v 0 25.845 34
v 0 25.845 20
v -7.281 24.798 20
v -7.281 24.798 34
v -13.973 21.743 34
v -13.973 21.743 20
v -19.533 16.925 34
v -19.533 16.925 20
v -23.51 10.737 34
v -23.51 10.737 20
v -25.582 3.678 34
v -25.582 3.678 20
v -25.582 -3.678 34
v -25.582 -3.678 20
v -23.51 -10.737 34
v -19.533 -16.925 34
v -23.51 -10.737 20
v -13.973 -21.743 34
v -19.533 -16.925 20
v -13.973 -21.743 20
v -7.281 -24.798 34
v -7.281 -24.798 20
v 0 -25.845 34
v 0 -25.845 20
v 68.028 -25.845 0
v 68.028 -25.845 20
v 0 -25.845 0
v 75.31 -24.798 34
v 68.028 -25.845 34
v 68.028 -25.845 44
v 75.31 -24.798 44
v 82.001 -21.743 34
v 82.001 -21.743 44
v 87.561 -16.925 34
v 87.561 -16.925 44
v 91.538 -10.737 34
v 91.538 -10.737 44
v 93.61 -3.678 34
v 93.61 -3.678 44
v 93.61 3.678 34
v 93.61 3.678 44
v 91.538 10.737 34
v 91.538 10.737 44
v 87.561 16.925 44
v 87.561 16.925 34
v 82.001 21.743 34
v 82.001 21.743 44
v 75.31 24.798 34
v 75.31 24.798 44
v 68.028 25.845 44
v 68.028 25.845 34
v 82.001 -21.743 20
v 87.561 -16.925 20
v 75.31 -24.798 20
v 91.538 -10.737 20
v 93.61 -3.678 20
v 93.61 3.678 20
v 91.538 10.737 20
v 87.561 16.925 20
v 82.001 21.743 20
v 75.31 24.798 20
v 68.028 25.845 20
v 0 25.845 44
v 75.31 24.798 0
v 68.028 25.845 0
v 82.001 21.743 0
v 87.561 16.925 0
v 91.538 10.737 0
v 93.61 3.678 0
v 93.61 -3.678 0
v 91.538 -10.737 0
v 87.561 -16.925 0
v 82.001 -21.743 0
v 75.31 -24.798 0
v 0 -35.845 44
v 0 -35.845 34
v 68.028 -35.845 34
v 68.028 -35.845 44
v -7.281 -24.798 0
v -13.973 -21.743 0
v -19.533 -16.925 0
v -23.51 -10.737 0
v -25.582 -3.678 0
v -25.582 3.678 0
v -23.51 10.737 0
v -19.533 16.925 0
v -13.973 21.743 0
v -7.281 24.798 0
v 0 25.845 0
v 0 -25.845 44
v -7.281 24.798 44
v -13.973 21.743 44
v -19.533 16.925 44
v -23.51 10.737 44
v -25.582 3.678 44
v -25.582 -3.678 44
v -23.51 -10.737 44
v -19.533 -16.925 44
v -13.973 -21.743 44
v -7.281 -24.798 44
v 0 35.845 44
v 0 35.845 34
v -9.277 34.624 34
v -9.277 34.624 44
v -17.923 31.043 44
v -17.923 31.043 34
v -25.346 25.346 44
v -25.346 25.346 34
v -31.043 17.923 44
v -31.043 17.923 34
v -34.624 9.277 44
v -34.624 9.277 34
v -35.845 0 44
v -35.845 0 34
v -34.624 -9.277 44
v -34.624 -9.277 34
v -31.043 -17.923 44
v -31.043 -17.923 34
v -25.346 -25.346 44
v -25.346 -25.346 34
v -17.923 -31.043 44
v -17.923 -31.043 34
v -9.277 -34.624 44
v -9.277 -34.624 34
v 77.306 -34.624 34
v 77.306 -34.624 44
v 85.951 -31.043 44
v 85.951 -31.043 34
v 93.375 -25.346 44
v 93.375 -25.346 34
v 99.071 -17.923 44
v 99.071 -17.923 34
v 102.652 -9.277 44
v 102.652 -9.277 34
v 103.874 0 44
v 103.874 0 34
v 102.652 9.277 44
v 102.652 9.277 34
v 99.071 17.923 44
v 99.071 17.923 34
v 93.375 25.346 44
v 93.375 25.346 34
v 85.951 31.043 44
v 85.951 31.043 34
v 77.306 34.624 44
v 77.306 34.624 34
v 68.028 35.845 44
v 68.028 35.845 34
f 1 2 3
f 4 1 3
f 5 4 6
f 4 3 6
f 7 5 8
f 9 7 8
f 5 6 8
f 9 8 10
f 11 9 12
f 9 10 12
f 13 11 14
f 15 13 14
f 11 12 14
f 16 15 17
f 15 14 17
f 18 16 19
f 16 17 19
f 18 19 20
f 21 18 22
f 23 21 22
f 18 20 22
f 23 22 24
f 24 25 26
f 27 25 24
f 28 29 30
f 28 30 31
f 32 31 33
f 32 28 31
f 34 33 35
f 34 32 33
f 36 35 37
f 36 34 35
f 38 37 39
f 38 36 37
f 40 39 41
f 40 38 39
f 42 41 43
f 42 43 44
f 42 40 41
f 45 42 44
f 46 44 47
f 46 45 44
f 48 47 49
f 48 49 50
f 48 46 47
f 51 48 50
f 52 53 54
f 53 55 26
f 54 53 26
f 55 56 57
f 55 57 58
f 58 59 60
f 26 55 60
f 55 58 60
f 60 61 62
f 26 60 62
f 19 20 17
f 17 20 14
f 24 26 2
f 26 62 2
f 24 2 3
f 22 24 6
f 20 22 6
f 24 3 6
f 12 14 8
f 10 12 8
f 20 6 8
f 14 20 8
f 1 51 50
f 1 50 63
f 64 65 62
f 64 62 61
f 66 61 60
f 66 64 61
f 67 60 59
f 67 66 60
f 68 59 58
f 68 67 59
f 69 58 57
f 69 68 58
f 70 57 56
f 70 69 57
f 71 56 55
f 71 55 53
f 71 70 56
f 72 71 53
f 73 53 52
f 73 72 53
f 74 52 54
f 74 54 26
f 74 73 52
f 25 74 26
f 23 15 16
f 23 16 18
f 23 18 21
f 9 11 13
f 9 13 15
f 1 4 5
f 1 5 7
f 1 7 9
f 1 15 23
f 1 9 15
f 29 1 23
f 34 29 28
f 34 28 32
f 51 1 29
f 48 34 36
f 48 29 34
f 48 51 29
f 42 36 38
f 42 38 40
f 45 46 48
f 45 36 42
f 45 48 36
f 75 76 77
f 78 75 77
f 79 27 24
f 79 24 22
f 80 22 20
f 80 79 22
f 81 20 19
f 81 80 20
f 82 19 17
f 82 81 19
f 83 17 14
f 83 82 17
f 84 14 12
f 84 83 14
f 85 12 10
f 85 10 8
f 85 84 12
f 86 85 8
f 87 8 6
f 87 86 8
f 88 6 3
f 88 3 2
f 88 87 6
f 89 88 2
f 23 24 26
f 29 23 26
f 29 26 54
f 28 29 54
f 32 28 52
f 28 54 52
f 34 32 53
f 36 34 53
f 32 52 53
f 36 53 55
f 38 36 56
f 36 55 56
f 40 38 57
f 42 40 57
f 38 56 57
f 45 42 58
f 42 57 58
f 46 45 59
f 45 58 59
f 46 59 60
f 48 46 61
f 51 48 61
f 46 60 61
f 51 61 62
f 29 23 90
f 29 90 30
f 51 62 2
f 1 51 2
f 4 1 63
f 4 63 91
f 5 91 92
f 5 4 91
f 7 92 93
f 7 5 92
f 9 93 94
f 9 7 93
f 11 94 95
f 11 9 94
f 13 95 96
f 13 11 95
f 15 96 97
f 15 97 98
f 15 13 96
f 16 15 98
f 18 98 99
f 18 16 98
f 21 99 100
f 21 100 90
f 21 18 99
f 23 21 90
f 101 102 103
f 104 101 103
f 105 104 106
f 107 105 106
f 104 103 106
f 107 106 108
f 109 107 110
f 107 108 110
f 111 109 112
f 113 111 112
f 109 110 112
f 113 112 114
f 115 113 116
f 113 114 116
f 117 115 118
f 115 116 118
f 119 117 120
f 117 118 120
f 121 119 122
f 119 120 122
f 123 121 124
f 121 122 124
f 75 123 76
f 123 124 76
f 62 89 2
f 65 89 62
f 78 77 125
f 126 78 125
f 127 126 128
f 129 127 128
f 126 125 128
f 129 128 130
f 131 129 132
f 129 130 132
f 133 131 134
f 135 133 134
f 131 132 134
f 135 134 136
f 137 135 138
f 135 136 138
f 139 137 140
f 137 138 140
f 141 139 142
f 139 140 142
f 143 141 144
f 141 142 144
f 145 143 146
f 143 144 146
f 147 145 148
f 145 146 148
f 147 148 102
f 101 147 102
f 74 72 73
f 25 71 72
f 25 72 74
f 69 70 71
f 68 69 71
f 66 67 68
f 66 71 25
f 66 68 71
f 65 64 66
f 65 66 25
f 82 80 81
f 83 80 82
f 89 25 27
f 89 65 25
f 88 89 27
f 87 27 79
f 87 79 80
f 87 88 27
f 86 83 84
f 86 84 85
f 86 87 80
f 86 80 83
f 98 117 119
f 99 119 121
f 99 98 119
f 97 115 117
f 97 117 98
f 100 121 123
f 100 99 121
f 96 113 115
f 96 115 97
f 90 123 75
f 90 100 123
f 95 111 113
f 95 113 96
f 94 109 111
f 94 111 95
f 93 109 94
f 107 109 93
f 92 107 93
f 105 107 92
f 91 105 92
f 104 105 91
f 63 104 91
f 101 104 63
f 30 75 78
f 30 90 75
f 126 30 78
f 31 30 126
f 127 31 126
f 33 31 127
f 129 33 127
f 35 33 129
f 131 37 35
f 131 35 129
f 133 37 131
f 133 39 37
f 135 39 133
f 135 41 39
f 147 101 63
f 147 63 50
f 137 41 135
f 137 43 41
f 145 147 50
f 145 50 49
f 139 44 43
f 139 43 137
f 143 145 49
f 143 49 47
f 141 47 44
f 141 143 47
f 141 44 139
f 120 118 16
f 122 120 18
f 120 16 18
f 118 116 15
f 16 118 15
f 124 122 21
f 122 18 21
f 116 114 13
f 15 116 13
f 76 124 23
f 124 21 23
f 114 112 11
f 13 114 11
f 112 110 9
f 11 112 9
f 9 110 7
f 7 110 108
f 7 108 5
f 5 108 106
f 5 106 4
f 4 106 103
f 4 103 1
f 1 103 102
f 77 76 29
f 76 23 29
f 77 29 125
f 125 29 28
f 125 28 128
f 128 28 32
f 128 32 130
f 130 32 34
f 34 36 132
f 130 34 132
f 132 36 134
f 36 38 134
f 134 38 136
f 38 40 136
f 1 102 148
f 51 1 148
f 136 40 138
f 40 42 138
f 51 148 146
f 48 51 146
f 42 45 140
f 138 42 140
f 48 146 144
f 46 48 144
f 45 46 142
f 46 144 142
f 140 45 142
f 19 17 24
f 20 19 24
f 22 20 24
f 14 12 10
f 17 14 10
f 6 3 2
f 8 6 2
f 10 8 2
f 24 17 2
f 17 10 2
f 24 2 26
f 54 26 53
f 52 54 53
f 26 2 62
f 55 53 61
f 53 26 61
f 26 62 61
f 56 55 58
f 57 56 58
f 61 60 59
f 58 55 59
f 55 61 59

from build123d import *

# Parameters (mm, degrees)
EXTRUDE_1_DEPTH   = 20
EXTRUDE_2_DEPTH   = 14
EXTRUDE_1_2_DEPTH = 10


with BuildPart() as part:
    # 草图1 → Extrude 1 (new body)
    with BuildSketch(Plane.XY):
        with BuildLine():
            Line((0, 25.845361824), (68.028206251, 25.845361824))
            ThreePointArc((68.028206251, 25.845361824), (93.873568075, 0), (68.028206251, -25.845361824))
            Line((68.028206251, -25.845361824), (0, -25.845361824))
            ThreePointArc((0, -25.845361824), (-25.845361824, 0), (0, 25.845361824))
        make_face()
    extrude(amount=EXTRUDE_1_DEPTH)


with BuildPart() as body_2:
    # 草图6 → 凸台-拉伸2 (new body)
    with BuildSketch(Plane.XY.offset(20)):
        with BuildLine():
            Line((0, -25.845361824), (68.028206251, -25.845361824))
            ThreePointArc((68.028206251, -25.845361824), (93.873568075, 0), (68.028206251, 25.845361824))
            Line((68.028206251, 25.845361824), (0, 25.845361824))
            ThreePointArc((0, 25.845361824), (-25.845361824, 0), (0, -25.845361824))
        make_face()
    extrude(amount=EXTRUDE_2_DEPTH)


with BuildPart() as body_3:
    # 草图7 → Extrude 1 2 (new body)
    with BuildSketch(Plane.XY.offset(34)):
        with BuildLine():
            Line((68.028206251, 35.845361824), (0, 35.845361824))
            ThreePointArc((0, 35.845361824), (-35.845361824, 0), (0, -35.845361824))
            Line((0, -35.845361824), (68.028206251, -35.845361824))
            ThreePointArc((68.028206251, -35.845361824), (103.873568075, 0), (68.028206251, 35.845361824))
        make_face()
        with BuildLine():
            Line((68.028206251, 25.845361824), (0, 25.845361824))
            ThreePointArc((0, 25.845361824), (-25.845361824, 0), (0, -25.845361824))
            Line((0, -25.845361824), (68.028206251, -25.845361824))
            ThreePointArc((68.028206251, -25.845361824), (93.873568075, 0), (68.028206251, 25.845361824))
        make_face(mode=Mode.SUBTRACT)
    extrude(amount=EXTRUDE_1_2_DEPTH)


solid = Compound([part.part, body_2.part, body_3.part])
